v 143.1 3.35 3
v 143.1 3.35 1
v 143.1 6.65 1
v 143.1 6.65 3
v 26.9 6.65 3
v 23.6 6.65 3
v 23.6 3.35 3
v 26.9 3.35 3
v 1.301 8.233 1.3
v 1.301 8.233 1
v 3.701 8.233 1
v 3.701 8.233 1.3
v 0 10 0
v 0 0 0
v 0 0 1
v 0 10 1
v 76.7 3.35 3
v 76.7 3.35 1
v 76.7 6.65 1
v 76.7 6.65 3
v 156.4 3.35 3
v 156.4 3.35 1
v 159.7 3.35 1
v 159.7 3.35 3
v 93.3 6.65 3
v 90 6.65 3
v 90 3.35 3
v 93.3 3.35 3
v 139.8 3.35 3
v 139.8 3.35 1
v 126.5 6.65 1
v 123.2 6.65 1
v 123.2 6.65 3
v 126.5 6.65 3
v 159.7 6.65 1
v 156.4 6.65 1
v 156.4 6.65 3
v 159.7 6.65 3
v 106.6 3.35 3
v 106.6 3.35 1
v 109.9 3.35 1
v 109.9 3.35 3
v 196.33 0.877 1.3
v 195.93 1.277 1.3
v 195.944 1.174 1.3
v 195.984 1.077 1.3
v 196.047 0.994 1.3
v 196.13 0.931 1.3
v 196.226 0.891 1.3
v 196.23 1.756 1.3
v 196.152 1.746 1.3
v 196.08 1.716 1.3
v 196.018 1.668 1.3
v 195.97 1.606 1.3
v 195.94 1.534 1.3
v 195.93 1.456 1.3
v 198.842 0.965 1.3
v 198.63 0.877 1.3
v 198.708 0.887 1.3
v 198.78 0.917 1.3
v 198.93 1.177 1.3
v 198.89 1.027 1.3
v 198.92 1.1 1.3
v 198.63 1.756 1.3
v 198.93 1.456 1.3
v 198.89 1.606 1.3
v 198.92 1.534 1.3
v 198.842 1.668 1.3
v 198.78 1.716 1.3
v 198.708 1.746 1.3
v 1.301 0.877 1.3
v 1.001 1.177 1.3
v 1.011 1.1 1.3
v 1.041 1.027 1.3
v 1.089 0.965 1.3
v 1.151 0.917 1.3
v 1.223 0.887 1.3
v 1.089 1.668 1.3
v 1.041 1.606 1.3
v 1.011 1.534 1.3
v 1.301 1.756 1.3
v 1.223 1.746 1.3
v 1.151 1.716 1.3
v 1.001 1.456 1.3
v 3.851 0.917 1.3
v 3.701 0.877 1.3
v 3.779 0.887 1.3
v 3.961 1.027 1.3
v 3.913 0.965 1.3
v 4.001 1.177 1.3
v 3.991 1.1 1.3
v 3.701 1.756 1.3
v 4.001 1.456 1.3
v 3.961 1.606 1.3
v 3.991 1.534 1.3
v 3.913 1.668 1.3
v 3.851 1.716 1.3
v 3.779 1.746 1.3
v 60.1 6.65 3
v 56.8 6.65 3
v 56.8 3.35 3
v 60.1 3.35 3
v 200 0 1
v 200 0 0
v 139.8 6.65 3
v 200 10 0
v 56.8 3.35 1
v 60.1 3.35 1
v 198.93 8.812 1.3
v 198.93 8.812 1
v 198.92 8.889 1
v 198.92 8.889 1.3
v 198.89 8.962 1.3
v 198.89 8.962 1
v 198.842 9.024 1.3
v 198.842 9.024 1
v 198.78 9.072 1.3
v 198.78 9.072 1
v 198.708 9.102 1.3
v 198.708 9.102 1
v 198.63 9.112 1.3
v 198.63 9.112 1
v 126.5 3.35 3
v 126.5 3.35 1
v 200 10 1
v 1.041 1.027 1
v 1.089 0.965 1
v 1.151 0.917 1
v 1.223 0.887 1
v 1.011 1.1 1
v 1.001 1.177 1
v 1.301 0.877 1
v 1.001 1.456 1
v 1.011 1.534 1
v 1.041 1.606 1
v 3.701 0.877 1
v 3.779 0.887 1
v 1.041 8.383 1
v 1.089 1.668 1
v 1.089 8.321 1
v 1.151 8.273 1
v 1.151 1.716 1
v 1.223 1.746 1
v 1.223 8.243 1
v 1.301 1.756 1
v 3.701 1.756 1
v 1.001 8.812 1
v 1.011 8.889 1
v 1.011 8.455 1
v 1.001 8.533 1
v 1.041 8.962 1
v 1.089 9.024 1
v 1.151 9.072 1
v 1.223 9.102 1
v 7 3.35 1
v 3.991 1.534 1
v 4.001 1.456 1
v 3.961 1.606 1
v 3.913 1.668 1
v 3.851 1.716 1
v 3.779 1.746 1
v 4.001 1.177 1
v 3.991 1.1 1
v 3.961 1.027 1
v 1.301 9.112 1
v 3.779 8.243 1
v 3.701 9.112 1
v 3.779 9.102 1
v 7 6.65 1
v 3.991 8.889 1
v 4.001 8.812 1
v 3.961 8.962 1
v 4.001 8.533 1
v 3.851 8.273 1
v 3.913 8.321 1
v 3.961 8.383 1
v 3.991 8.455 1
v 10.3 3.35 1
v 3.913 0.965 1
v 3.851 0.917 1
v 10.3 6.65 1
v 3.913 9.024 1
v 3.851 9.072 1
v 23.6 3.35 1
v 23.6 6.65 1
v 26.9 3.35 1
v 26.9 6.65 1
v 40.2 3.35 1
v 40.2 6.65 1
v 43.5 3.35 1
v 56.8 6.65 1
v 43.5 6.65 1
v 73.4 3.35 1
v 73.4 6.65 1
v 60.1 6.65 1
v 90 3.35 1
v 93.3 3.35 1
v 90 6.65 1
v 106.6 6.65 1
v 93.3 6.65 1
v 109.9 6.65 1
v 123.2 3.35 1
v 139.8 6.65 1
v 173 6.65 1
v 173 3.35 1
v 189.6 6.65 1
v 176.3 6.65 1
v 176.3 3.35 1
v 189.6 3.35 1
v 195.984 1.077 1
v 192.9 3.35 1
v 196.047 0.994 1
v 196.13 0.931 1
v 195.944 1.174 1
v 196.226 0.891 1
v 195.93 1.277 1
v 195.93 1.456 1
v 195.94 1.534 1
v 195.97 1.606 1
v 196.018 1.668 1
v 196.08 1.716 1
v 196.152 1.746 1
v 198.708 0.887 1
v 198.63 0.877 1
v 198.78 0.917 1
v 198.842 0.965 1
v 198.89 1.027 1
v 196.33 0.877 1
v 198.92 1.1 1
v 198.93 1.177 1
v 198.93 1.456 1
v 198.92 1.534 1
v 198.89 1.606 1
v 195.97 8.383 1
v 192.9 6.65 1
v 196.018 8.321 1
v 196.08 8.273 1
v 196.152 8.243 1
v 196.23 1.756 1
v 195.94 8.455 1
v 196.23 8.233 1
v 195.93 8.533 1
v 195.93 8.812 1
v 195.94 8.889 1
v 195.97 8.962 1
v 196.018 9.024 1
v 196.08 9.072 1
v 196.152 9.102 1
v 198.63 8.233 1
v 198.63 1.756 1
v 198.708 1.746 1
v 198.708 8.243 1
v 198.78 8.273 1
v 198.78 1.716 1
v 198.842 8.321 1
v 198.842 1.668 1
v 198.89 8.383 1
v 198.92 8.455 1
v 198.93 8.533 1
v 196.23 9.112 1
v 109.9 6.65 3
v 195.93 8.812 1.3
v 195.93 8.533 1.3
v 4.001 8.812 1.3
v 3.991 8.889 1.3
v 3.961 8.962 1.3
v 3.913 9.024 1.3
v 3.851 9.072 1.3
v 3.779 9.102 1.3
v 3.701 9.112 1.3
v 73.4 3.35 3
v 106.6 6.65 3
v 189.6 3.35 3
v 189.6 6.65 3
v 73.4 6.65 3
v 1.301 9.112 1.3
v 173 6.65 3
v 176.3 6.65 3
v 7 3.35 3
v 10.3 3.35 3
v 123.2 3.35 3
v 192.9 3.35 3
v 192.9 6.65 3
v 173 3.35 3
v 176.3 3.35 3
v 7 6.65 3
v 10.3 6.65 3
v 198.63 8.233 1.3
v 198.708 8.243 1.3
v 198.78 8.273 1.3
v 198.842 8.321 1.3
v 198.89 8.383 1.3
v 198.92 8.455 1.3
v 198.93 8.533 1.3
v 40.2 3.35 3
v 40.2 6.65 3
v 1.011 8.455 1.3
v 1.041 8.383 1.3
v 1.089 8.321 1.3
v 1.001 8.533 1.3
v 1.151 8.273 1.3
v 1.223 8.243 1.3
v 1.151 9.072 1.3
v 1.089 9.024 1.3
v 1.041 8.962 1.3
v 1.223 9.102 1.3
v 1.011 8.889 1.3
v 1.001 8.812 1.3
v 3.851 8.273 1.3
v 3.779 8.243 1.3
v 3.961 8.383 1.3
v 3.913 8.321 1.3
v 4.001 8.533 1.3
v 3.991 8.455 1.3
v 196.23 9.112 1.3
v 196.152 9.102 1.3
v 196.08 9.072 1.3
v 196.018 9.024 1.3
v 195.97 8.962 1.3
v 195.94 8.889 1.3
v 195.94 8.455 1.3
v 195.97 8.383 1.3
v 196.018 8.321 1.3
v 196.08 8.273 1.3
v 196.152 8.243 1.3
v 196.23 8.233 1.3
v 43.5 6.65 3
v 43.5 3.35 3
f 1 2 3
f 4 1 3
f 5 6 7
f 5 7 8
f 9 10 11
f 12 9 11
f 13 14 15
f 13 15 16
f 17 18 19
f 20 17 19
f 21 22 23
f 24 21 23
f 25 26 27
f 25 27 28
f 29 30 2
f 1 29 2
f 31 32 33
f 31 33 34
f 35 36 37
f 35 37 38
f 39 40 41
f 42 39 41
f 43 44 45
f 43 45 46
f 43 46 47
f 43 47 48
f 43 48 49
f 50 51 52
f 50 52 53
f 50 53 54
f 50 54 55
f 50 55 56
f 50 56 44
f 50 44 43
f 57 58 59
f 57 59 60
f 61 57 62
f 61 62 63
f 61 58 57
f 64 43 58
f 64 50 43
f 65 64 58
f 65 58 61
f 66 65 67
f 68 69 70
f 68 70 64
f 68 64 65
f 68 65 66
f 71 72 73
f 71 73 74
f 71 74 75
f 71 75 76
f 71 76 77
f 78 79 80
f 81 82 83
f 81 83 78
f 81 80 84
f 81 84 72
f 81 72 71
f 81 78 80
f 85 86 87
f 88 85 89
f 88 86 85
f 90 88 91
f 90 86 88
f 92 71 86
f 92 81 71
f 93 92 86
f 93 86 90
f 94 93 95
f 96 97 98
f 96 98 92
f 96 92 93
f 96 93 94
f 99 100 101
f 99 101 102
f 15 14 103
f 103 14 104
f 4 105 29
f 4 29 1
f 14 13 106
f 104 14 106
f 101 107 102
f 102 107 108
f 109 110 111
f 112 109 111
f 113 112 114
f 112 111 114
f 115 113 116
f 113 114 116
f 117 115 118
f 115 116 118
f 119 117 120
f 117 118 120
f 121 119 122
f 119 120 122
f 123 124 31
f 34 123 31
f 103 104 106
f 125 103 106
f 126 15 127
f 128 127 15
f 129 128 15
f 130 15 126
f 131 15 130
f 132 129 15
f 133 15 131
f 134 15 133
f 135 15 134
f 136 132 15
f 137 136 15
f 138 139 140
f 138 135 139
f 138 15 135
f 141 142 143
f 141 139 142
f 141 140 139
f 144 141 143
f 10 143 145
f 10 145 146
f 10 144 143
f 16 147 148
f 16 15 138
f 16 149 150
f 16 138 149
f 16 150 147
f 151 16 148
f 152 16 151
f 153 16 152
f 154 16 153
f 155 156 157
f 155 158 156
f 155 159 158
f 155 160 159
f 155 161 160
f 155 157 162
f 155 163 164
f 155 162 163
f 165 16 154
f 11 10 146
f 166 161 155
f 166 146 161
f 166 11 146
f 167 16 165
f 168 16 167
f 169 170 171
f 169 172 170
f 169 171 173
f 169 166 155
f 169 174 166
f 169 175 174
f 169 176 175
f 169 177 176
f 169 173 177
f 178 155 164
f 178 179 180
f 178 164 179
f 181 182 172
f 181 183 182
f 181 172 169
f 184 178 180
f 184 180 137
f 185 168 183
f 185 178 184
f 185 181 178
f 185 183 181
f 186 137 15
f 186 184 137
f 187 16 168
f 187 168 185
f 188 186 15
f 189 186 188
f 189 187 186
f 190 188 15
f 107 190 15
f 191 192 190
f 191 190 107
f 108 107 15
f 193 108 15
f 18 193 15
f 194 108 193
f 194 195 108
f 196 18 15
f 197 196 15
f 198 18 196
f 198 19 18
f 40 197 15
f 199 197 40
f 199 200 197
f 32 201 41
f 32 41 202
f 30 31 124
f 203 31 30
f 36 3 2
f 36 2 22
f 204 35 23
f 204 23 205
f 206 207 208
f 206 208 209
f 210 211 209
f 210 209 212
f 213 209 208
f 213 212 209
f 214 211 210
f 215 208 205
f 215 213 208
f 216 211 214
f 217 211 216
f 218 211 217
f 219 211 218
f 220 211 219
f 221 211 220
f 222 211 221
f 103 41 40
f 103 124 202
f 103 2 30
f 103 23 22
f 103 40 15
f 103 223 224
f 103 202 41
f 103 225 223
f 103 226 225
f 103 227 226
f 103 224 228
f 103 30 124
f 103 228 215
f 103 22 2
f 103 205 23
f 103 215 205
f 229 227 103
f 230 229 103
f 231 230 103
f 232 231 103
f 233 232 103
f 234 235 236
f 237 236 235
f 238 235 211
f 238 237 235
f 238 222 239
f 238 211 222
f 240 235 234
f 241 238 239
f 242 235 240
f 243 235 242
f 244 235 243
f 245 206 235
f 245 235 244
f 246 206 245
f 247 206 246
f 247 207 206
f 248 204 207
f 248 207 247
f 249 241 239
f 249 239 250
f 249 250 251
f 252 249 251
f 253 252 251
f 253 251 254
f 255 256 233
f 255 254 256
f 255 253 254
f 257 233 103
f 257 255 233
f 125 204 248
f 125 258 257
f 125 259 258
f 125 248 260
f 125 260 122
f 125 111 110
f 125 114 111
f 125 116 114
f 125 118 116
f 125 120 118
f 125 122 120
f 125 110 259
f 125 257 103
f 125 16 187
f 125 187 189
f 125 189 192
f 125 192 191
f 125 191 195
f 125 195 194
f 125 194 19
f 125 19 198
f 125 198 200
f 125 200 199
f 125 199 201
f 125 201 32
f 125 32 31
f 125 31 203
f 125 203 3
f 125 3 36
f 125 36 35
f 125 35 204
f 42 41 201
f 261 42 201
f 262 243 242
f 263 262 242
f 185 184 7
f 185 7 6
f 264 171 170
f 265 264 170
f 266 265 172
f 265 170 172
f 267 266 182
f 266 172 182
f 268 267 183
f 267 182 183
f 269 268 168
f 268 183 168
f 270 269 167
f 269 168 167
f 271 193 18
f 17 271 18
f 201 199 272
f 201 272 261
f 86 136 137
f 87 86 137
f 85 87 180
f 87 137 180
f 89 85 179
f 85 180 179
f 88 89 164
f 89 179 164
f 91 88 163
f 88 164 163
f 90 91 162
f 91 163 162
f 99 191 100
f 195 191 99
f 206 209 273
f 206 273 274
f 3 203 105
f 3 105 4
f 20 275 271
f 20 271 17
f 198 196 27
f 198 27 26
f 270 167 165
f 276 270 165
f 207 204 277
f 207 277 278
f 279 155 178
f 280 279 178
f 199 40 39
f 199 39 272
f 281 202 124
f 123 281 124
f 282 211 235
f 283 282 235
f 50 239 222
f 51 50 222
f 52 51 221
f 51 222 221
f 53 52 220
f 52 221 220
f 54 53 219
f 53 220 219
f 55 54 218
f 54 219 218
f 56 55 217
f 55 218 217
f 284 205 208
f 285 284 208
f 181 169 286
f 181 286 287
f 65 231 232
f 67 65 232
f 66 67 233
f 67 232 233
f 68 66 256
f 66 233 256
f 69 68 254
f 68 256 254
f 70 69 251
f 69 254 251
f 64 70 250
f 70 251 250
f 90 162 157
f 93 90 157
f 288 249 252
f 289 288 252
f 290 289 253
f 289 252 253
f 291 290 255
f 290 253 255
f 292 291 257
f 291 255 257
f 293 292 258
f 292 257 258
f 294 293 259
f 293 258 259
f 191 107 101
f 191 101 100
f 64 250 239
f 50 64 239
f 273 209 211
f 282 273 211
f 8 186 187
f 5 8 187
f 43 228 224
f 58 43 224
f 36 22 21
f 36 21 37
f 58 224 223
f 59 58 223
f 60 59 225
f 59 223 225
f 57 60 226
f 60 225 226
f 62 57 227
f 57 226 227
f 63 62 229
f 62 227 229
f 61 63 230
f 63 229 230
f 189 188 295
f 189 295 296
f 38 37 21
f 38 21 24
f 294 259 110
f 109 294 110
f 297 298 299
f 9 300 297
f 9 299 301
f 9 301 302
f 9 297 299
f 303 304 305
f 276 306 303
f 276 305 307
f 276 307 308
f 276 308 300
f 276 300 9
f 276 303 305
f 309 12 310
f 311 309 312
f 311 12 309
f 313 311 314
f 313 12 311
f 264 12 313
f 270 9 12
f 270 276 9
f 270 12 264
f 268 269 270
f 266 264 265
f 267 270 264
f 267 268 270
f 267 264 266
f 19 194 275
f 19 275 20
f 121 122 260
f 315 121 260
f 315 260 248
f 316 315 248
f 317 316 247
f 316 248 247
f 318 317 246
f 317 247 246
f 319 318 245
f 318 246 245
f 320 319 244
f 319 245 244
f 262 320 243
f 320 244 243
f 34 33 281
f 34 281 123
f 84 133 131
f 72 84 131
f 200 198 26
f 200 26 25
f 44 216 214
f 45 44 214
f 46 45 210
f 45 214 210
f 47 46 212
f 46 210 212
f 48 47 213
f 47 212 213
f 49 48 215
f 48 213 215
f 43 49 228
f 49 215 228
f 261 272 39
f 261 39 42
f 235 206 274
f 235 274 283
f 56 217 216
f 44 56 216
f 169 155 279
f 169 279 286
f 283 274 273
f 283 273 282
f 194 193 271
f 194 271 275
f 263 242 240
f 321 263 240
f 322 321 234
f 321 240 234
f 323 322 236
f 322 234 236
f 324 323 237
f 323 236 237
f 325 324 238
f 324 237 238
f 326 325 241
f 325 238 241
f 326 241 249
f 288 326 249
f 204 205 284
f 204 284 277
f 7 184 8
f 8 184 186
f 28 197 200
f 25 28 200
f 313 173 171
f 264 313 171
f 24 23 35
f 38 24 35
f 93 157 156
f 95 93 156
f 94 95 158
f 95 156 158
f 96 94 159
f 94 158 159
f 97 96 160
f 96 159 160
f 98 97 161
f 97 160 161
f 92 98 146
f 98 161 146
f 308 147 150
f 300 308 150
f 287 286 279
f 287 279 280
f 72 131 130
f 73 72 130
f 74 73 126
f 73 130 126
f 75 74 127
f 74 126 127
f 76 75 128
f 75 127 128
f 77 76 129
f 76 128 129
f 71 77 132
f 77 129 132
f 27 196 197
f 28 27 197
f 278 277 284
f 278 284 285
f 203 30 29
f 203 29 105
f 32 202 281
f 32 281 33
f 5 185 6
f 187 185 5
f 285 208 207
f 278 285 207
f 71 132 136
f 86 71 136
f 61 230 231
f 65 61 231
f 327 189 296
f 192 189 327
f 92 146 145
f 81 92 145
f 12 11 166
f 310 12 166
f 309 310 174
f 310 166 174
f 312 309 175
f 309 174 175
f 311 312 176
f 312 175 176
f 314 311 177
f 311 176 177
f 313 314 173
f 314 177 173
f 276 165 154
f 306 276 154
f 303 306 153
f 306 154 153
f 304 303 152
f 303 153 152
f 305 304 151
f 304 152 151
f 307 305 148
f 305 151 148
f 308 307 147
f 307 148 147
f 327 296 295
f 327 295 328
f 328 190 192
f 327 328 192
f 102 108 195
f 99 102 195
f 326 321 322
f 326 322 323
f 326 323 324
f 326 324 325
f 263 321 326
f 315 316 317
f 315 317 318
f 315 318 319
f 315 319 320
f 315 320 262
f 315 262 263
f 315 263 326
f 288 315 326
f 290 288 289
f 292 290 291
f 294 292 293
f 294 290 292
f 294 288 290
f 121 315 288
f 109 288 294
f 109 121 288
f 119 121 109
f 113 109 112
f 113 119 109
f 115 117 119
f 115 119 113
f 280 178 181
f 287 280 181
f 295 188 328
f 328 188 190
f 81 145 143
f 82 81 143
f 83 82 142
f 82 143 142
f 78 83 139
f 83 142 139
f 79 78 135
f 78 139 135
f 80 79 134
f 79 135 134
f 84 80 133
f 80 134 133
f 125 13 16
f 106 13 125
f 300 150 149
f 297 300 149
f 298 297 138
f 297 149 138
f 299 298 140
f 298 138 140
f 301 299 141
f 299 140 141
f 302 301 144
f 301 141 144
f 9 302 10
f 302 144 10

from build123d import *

# Parameters (mm, degrees)
F0_W     = 200
F0_H     = 10
F1_DEPTH = 1
F2_W     = 3.3
F2_H     = 3.3
F3_DEPTH = 2
F5_DEPTH = 0.3


with BuildPart() as f1:
    # F0 (on Top) → F1 (new body)
    with BuildSketch(Plane.XY):
        with Locations((100, 5)):
            Rectangle(F0_W, F0_H)
    extrude(amount=F1_DEPTH)

    # F2 (on face) → F3 (join)
    with BuildSketch(Plane.XY.offset(1)):
        with Locations((8.65, 5)):
            Rectangle(F2_W, F2_H)
        with Locations((25.25, 5)):
            Rectangle(F2_W, F2_H)
        with Locations((41.85, 5)):
            Rectangle(F2_W, F2_H)
        with Locations((58.45, 5)):
            Rectangle(F2_W, F2_H)
        with Locations((75.05, 5)):
            Rectangle(F2_W, F2_H)
        with Locations((91.65, 5)):
            Rectangle(F2_W, F2_H)
        with Locations((108.25, 5)):
            Rectangle(F2_W, F2_H)
        with Locations((124.85, 5)):
            Rectangle(F2_W, F2_H)
        with Locations((141.45, 5)):
            Rectangle(F2_W, F2_H)
        with Locations((158.05, 5)):
            Rectangle(F2_W, F2_H)
        with Locations((174.65, 5)):
            Rectangle(F2_W, F2_H)
        with Locations((191.25, 5)):
            Rectangle(F2_W, F2_H)
    extrude(amount=F3_DEPTH)

    # F4 (on face) → F5 (join)
    with BuildSketch(Plane.XY.offset(1)):
        with BuildLine():
            ThreePointArc((1.001016, 1.177174), (1.088884, 0.965042), (1.301016, 0.877174))
            Line((1.301016, 0.877174), (3.701016, 0.877174))
            ThreePointArc((3.701016, 0.877174), (3.913148, 0.965042), (4.001016, 1.177174))
            Line((4.001016, 1.177174), (4.001016, 1.456027))
            ThreePointArc((4.001016, 1.456027), (3.913148, 1.668159), (3.701016, 1.756027))
            Line((3.701016, 1.756027), (1.301016, 1.756027))
            ThreePointArc((1.301016, 1.756027), (1.088884, 1.668159), (1.001016, 1.456027))
            Line((1.001016, 1.456027), (1.001016, 1.177174))
        make_face()
        with BuildLine():
            ThreePointArc((198.629966, 8.232874), (198.842098, 8.320742), (198.929966, 8.532874))
            Line((198.929966, 8.532874), (198.929966, 8.811727))
            ThreePointArc((198.929966, 8.811727), (198.842098, 9.023859), (198.629966, 9.111727))
            Line((198.629966, 9.111727), (196.229966, 9.111727))
            ThreePointArc((196.229966, 9.111727), (196.017834, 9.023859), (195.929966, 8.811727))
            Line((195.929966, 8.811727), (195.929966, 8.532874))
            ThreePointArc((195.929966, 8.532874), (196.017834, 8.320742), (196.229966, 8.232874))
            Line((196.229966, 8.232874), (198.629966, 8.232874))
        make_face()
        with BuildLine():
            ThreePointArc((198.629966, 0.877174), (198.842098, 0.965042), (198.929966, 1.177174))
            Line((198.929966, 1.177174), (198.929966, 1.456027))
            ThreePointArc((198.929966, 1.456027), (198.842098, 1.668159), (198.629966, 1.756027))
            Line((198.629966, 1.756027), (196.229966, 1.756027))
            ThreePointArc((196.229966, 1.756027), (196.017834, 1.668159), (195.929966, 1.456027))
            Line((195.929966, 1.456027), (195.929966, 1.277174))
            ThreePointArc((195.929966, 1.277174), (196.047123, 0.994331), (196.329966, 0.877174))
            Line((196.329966, 0.877174), (198.629966, 0.877174))
        make_face()
        with BuildLine():
            ThreePointArc((3.701016, 8.232874), (3.913148, 8.320742), (4.001016, 8.532874))
            Line((4.001016, 8.532874), (4.001016, 8.811727))
            ThreePointArc((4.001016, 8.811727), (3.913148, 9.023859), (3.701016, 9.111727))
            Line((3.701016, 9.111727), (1.301016, 9.111727))
            ThreePointArc((1.301016, 9.111727), (1.088884, 9.023859), (1.001016, 8.811727))
            Line((1.001016, 8.811727), (1.001016, 8.532874))
            ThreePointArc((1.001016, 8.532874), (1.088884, 8.320742), (1.301016, 8.232874))
            Line((1.301016, 8.232874), (3.701016, 8.232874))
        make_face()
    extrude(amount=F5_DEPTH)


solid = f1.part
